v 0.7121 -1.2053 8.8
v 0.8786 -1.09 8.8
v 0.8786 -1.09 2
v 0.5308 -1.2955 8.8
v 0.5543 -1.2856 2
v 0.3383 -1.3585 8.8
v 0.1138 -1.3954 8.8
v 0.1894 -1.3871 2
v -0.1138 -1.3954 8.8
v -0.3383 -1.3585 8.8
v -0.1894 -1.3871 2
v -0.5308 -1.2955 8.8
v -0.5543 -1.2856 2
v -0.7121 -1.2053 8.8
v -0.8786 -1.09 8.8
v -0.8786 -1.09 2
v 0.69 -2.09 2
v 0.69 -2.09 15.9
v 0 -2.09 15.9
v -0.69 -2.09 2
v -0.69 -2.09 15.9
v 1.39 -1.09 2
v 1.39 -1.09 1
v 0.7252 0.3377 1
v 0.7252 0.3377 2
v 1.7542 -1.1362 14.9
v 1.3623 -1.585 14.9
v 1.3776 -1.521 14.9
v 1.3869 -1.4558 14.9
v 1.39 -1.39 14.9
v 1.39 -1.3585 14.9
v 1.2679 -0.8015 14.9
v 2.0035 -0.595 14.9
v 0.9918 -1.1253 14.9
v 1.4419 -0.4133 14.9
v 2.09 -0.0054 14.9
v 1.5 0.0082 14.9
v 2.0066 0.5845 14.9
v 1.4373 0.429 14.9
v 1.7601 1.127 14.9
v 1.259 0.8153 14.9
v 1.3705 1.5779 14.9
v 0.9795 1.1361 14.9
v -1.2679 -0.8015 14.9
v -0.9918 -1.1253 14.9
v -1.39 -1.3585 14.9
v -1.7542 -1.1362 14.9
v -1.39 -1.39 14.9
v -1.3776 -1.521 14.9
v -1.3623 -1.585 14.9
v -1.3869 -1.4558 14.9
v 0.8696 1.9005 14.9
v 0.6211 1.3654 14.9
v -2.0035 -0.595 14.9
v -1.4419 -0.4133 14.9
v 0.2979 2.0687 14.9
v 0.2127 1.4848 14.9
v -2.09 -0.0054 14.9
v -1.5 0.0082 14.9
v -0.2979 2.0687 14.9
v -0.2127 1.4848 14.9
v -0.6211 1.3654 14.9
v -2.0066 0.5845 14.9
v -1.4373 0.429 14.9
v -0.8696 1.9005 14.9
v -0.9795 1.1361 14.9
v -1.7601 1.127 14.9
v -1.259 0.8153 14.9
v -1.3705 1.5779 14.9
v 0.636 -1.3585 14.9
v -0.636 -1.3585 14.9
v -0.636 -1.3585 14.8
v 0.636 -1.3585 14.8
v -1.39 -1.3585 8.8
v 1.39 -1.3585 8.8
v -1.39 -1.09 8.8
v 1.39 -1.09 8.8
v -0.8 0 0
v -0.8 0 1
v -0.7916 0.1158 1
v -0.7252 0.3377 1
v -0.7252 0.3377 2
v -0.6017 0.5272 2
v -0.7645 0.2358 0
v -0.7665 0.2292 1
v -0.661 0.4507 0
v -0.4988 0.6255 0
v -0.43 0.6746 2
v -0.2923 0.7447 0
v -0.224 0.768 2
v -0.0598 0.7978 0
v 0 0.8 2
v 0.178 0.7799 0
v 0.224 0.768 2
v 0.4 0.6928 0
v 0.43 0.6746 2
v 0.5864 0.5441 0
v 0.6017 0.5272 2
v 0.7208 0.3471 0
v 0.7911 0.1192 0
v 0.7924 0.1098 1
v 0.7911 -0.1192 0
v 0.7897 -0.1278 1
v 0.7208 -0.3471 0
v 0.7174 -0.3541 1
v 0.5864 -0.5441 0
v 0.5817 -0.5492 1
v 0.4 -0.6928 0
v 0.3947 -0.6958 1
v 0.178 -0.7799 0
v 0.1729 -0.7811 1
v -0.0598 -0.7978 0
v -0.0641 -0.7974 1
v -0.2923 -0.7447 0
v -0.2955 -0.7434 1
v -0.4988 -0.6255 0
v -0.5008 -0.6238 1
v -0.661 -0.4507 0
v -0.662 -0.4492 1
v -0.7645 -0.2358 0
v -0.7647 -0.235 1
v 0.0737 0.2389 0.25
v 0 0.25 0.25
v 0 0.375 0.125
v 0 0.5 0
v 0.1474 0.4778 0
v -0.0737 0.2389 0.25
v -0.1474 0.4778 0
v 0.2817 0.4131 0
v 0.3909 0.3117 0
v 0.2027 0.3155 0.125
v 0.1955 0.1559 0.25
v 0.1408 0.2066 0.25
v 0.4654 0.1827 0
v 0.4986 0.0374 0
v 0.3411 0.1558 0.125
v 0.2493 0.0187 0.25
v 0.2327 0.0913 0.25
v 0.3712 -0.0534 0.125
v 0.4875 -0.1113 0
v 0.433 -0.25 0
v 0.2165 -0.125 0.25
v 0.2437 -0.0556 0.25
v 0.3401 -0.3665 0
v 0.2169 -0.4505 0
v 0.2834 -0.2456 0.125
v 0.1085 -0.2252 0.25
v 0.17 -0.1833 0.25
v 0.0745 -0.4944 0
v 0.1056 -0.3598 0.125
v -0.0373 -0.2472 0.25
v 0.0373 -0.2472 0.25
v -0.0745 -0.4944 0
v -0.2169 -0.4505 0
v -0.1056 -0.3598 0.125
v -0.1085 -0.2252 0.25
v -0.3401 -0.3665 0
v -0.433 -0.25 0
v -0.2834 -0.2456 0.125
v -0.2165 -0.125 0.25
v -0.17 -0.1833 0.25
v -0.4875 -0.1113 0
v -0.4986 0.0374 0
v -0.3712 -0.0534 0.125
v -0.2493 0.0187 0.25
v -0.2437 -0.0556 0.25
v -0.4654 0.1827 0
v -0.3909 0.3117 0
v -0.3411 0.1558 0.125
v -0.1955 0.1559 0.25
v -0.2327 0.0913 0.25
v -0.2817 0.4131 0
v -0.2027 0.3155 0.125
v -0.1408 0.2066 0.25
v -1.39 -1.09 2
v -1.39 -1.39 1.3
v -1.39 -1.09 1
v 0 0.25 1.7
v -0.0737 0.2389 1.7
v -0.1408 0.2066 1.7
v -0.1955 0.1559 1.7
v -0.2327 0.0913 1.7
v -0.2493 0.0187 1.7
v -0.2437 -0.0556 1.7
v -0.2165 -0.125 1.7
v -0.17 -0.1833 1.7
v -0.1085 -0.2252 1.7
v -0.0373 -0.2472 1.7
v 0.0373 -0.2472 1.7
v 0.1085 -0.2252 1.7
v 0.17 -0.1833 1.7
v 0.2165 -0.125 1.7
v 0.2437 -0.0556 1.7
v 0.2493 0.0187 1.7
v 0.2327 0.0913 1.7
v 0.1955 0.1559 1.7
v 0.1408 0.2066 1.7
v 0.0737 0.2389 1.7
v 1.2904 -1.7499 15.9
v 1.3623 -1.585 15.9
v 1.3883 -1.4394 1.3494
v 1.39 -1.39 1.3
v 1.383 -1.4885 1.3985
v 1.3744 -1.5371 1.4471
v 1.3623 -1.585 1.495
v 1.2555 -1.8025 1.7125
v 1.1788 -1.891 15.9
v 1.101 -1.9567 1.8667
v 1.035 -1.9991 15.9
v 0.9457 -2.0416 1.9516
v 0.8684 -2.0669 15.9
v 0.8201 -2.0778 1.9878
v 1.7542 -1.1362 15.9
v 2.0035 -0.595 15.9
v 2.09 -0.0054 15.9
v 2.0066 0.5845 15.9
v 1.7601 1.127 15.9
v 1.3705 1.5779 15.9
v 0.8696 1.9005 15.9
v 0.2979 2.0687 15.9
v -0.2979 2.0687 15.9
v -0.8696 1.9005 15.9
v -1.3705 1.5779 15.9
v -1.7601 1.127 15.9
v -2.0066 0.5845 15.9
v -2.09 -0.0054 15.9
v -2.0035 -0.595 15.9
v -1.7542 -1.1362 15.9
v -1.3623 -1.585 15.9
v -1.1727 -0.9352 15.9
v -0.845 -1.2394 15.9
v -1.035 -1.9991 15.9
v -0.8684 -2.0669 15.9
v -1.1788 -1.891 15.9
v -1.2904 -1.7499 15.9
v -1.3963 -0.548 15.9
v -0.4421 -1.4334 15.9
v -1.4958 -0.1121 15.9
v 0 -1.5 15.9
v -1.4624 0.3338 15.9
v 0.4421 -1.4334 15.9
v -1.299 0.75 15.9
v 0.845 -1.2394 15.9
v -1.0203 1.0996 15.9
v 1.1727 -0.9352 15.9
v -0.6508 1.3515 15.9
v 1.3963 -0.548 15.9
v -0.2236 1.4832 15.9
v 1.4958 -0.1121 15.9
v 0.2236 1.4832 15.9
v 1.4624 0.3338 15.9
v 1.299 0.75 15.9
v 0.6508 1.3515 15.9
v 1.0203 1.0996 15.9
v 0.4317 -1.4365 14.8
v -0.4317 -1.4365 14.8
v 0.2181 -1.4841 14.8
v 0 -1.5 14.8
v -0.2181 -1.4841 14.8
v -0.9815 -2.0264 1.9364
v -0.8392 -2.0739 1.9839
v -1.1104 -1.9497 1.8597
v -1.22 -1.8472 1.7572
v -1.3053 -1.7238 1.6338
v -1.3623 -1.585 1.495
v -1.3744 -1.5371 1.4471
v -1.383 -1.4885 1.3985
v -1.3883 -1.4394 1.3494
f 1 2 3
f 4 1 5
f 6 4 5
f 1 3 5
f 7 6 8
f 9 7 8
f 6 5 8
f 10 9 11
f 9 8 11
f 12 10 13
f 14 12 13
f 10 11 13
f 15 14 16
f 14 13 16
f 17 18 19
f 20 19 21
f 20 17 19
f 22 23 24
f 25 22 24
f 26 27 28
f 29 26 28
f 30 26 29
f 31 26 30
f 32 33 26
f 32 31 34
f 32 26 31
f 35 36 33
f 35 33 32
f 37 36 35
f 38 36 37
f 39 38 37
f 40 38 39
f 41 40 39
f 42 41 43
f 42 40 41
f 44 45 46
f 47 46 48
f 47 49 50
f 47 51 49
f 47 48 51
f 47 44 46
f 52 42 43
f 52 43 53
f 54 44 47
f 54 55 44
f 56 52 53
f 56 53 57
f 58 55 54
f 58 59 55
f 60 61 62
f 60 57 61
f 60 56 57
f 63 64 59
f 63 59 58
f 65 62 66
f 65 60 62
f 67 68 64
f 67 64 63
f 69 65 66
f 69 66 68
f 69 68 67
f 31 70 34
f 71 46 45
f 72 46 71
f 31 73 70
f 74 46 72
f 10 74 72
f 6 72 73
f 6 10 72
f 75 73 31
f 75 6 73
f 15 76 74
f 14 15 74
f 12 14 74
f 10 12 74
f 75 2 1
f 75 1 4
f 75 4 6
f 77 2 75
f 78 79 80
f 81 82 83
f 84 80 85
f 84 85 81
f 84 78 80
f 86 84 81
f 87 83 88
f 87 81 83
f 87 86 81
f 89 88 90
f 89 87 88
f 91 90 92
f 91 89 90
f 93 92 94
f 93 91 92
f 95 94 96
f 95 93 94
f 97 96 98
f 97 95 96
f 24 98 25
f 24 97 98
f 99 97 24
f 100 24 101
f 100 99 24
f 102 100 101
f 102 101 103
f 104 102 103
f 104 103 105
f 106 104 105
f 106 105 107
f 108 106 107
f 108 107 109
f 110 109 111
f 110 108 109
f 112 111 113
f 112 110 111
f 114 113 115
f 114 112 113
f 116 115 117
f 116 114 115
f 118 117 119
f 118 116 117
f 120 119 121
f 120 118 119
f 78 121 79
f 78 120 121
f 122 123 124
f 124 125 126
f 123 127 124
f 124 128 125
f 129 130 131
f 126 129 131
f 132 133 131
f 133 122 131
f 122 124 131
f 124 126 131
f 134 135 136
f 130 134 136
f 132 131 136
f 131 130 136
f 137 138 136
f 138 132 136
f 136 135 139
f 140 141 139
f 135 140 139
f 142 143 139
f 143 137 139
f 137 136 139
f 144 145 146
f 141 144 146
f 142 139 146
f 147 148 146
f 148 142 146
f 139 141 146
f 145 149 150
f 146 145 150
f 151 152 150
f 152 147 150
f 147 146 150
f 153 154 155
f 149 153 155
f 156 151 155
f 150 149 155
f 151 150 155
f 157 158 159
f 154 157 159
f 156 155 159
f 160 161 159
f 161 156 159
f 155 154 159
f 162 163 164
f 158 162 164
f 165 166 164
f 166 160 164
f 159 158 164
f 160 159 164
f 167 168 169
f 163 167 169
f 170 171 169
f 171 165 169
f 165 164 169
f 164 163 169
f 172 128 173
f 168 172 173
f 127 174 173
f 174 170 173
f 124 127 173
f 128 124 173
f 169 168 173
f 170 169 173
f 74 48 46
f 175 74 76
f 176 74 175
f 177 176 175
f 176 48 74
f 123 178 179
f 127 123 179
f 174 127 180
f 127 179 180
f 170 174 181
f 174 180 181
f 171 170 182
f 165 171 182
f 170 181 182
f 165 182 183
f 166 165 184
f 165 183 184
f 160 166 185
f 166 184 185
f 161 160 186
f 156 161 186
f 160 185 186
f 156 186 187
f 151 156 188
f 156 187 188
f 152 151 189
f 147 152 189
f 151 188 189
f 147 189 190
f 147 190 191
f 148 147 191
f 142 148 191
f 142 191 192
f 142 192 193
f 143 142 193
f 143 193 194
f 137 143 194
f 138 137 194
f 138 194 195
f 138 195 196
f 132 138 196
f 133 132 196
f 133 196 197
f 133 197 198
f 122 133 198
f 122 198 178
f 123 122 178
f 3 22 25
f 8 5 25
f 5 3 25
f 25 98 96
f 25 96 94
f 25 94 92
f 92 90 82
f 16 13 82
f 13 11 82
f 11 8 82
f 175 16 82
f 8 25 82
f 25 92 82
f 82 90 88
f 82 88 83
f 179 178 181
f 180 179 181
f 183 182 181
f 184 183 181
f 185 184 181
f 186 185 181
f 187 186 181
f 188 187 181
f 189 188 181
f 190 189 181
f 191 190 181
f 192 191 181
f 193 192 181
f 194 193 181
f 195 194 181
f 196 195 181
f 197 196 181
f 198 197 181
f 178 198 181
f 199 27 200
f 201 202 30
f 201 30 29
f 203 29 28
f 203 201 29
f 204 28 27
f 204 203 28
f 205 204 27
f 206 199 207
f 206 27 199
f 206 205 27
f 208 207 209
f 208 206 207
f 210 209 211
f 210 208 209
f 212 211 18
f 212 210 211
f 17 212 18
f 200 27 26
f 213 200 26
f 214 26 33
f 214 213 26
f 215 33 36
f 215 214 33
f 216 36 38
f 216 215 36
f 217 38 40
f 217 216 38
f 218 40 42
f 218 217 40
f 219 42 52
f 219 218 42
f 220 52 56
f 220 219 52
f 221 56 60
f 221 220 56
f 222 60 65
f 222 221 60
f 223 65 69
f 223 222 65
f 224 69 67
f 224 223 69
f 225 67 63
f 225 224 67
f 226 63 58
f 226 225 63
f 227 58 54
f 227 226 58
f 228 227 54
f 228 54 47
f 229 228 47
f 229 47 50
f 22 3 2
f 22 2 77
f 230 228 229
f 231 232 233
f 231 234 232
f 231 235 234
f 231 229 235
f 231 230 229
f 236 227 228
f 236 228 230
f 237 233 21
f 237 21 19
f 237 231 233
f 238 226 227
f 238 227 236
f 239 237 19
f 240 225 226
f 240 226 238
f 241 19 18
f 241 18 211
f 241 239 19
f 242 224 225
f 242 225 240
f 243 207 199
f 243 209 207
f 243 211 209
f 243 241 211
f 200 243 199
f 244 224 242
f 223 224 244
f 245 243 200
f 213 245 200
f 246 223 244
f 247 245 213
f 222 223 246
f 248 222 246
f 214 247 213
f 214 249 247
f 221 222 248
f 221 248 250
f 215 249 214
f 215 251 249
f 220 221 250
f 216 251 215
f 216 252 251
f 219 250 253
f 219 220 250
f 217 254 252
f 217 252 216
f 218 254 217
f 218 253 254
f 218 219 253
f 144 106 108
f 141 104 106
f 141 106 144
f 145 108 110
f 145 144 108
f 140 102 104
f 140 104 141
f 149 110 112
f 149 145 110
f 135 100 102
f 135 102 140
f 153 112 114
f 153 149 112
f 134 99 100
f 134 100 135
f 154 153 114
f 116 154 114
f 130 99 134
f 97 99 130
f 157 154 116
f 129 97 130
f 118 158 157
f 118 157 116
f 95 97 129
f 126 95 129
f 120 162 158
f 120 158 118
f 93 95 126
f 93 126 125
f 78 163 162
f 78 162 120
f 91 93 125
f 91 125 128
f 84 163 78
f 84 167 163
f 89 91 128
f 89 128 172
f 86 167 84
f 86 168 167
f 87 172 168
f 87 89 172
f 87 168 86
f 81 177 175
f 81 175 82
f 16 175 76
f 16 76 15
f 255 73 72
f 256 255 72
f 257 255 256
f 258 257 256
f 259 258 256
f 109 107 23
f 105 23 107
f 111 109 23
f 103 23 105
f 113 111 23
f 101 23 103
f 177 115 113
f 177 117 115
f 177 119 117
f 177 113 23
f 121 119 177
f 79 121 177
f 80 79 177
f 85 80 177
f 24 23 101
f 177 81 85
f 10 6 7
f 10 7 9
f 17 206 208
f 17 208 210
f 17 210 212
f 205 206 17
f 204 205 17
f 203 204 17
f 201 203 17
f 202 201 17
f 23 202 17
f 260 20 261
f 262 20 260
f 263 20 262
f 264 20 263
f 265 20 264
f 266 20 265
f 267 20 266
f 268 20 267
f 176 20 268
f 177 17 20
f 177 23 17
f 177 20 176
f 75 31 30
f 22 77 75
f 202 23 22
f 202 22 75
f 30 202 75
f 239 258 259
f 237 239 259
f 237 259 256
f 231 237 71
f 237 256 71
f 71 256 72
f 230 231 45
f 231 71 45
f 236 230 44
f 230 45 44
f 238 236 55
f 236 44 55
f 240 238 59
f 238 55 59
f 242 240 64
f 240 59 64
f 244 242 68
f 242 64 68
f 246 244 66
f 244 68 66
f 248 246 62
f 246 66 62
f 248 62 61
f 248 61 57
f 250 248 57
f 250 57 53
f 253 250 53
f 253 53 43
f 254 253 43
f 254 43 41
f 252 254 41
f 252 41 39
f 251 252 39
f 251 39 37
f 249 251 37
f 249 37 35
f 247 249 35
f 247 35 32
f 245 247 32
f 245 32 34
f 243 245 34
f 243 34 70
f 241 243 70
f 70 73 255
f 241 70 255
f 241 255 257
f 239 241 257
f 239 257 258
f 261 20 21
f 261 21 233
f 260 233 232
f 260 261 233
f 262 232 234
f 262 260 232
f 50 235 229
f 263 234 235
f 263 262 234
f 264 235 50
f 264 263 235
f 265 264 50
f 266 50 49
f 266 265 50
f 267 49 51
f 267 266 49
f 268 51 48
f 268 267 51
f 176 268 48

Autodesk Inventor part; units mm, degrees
ref_plane "YZ Plane" through (0, 0, 0) normal (1, 0, 0) x (0, 1, 0)
ref_plane "XZ Plane" through (0, 0, 0) normal (0, 1, 0) x (-1, 0, 0)
ref_plane "XY Plane" through (0, 0, 0) normal (0, 0, 1) x (1, 0, 0)
sketch "Sketch1" plane through (0, 0, 0) normal (0, 0, 1) x (1, 0, 0)
  line L0 (-1.39, -1.09) -> (1.39, -1.09)
  line L1 (1.39, -1.09) -> (1.39, -2.09)
  line L2 (1.39, -2.09) -> (-1.39, -2.09)
  line L3 (-1.39, -2.09) -> (-1.39, -1.09)
  point P0 (0, 0)
  dimension "d0" = 1
  dimension "d1" = 1.39
  dimension "d2" = 2.78
  dimension "d3" = 1.09
extrude "Extrusion1" add sketch "Sketch1" along normal blind 15.9
sketch "Sketch2" plane through (-1.39, -1.09, 0) normal (0, 1, 0) x (1, 0, 0)
  line L0 (0, 0) -> (0, -15.9) projected
  line L1 (0, -8.8) -> (2.78, -8.8)
  line L2 (2.78, -8.8) -> (2.78, -15.9)
  line L3 (2.78, -15.9) -> (0, -15.9)
  line L4 (0, -15.9) -> (0, -8.8)
  point P0 (1.39, 0)
  dimension "d6" = 7.1
extrude "Extrusion2" cut sketch "Sketch2" against normal blind 0.2685
sketch "Sketch3" plane through (0, 0, 0) normal (0, 0, -1) x (-1, 0, 0)
  line L0 (-1.39, -1.09) -> (1.39, -1.09)
  line L1 (1.39, -1.09) -> (1.39, 1.69)
  line L2 (1.39, 1.69) -> (-1.39, 1.69)
  line L3 (-1.39, 1.69) -> (-1.39, -1.09)
  point P0 (0, 0)
  dimension "d9" = 2.78
extrude "Extrusion3" add sketch "Sketch3" against normal blind 2
sketch "Sketch4" plane through (0, 0, 0) normal (0, 0, -1) x (-1, 0, 0)
  line L0 (-1.39, 1.69) -> (-1.39, -2.09) projected
  line L1 (1.39, -2.09) -> (1.39, 1.69) projected
  line L2 (1.39, 1.69) -> (-1.39, 1.69) projected
  circle A0 centre (0, 0) radius 0.8
  line L3 (-1.39, -1.3585) -> (1.39, -1.3585) projected
  line L4 (-1.39, -1.09) -> (1.39, -1.09) projected
  line L5 (-1.39, -1.09) -> (-0.7252, 0.3377)
  line L6 (1.39, -1.09) -> (0.7252, 0.3377)
  dimension "d12" = 1.6
extrude "Extrusion4" cut sketch "Sketch4" against normal through all contours L2 L1 L6 A0 L5 L0
sketch "Sketch5" plane through (0, 0, 0) normal (0, 0, -1) x (-1, 0, 0)
  line L0 (-0.7252, 0.3377) -> (-1.39, -1.09) projected
  line L1 (-1.39, -1.09) -> (-1.39, -2.09) projected
  line L2 (-1.39, -2.09) -> (1.39, -2.09) projected
  line L3 (1.39, -2.09) -> (1.39, -1.09) projected
  line L4 (1.39, -1.09) -> (0.7252, 0.3377) projected
  arc A0 (0.7252, 0.3377) -> (-0.7252, 0.3377) centre (0, 0) ccw projected
  circle A1 centre (0, 0) radius 0.8
extrude "Extrusion5" cut sketch "Sketch5" against normal blind 1 contours A1 L4 L3 L2 L1 L0
hole "Hole1" at (0, 0, 0) direction (0, 0, 1) diameter 0.5 depth 1.7 countersink diameter 1 countersink angle 90
sketch "Sketch6" plane through (-1.39, -2.09, 15.9) normal (0, -1, 0) x (1, 0, 0)
  line L0 (2.78, -15.9) -> (2.78, 0) projected
  line L1 (2.78, 0) -> (0, 0) projected
  circle A0 centre (1.39, -1.5) radius 0.5
  point P0 (2.78, -14.9)
  point P1 (1.39, -15.9)
  point P2 (1.39, -1)
  point P3 (1.39, -2)
  dimension "d26" = 1
  dimension "d27" = 1.39
  dimension "d28" = 1.5
extrude "Extrusion6" [suppressed]
chamfer "Chamfer1" distance 1 angle 45 1 edges at (0, -2.09, 1)
ref_plane "Work Plane1" through (0, -2.09, 14.9) normal (0, 0, 1) x (1, 0, 0)
ref_plane "Work Plane2" through (0, -2.09, 13.9) normal (0, 0, 1) x (1, 0, 0)
sketch "Sketch10" plane through (0, 0, 15.9) normal (0, 0, 1) x (1, 0, 0)
  line L0 (1.39, -1.3585) -> (-1.39, -1.3585) projected
  circle A0 centre (0, 0) radius 2.09
  line L1 (1.39, -2.09) -> (-1.39, -2.09) projected
  dimension "d54" = 4.18
extrude "Extrusion7" add sketch "Sketch10" against normal blind 1
sketch "Sketch11" plane through (0, 0, 15.9) normal (0, 0, 1) x (1, 0, 0)
  arc A0 (1.39, -1.5608) -> (-1.39, -1.5608) centre (0, 0) ccw projected
  circle A1 centre (0, 0) radius 1.3
  point P0 (1.6431, -0.954)
  point P1 (-1.6431, -0.954)
  dimension "d41" = 2.6
hole "Hole2" at (0, 0, 15.9) direction (0, 0, -1) diameter 3 depth 1.1
fillet "Fillet3" radius 0.7 2 edges at (1.39, -2.09, 8.95) (-1.39, -2.09, 8.95)
sketch "Sketch13" plane through (-1.39, -1.09, 8.8) normal (0, 0, 1) x (1, 0, 0)
  point P0 (1.39, 1.09)
  point P1 (1.39, 1.09)
hole "Hole4" at (0, 0, 8.8) at (0, 0, 8.8) direction (0, 0, -1) diameter 2.8 depth 6.8
sketch "Sketch15" plane through (0, -2.09, 14.9) normal (0, 0, 1) x (1, 0, 0)
  point P0 (0, 2.09)
  point P1 (0, 2.09)
hole "Hole5" [suppressed]
properties part number "MU_Motor_Asm_Frame_new3" material "Aluminum-6061"
